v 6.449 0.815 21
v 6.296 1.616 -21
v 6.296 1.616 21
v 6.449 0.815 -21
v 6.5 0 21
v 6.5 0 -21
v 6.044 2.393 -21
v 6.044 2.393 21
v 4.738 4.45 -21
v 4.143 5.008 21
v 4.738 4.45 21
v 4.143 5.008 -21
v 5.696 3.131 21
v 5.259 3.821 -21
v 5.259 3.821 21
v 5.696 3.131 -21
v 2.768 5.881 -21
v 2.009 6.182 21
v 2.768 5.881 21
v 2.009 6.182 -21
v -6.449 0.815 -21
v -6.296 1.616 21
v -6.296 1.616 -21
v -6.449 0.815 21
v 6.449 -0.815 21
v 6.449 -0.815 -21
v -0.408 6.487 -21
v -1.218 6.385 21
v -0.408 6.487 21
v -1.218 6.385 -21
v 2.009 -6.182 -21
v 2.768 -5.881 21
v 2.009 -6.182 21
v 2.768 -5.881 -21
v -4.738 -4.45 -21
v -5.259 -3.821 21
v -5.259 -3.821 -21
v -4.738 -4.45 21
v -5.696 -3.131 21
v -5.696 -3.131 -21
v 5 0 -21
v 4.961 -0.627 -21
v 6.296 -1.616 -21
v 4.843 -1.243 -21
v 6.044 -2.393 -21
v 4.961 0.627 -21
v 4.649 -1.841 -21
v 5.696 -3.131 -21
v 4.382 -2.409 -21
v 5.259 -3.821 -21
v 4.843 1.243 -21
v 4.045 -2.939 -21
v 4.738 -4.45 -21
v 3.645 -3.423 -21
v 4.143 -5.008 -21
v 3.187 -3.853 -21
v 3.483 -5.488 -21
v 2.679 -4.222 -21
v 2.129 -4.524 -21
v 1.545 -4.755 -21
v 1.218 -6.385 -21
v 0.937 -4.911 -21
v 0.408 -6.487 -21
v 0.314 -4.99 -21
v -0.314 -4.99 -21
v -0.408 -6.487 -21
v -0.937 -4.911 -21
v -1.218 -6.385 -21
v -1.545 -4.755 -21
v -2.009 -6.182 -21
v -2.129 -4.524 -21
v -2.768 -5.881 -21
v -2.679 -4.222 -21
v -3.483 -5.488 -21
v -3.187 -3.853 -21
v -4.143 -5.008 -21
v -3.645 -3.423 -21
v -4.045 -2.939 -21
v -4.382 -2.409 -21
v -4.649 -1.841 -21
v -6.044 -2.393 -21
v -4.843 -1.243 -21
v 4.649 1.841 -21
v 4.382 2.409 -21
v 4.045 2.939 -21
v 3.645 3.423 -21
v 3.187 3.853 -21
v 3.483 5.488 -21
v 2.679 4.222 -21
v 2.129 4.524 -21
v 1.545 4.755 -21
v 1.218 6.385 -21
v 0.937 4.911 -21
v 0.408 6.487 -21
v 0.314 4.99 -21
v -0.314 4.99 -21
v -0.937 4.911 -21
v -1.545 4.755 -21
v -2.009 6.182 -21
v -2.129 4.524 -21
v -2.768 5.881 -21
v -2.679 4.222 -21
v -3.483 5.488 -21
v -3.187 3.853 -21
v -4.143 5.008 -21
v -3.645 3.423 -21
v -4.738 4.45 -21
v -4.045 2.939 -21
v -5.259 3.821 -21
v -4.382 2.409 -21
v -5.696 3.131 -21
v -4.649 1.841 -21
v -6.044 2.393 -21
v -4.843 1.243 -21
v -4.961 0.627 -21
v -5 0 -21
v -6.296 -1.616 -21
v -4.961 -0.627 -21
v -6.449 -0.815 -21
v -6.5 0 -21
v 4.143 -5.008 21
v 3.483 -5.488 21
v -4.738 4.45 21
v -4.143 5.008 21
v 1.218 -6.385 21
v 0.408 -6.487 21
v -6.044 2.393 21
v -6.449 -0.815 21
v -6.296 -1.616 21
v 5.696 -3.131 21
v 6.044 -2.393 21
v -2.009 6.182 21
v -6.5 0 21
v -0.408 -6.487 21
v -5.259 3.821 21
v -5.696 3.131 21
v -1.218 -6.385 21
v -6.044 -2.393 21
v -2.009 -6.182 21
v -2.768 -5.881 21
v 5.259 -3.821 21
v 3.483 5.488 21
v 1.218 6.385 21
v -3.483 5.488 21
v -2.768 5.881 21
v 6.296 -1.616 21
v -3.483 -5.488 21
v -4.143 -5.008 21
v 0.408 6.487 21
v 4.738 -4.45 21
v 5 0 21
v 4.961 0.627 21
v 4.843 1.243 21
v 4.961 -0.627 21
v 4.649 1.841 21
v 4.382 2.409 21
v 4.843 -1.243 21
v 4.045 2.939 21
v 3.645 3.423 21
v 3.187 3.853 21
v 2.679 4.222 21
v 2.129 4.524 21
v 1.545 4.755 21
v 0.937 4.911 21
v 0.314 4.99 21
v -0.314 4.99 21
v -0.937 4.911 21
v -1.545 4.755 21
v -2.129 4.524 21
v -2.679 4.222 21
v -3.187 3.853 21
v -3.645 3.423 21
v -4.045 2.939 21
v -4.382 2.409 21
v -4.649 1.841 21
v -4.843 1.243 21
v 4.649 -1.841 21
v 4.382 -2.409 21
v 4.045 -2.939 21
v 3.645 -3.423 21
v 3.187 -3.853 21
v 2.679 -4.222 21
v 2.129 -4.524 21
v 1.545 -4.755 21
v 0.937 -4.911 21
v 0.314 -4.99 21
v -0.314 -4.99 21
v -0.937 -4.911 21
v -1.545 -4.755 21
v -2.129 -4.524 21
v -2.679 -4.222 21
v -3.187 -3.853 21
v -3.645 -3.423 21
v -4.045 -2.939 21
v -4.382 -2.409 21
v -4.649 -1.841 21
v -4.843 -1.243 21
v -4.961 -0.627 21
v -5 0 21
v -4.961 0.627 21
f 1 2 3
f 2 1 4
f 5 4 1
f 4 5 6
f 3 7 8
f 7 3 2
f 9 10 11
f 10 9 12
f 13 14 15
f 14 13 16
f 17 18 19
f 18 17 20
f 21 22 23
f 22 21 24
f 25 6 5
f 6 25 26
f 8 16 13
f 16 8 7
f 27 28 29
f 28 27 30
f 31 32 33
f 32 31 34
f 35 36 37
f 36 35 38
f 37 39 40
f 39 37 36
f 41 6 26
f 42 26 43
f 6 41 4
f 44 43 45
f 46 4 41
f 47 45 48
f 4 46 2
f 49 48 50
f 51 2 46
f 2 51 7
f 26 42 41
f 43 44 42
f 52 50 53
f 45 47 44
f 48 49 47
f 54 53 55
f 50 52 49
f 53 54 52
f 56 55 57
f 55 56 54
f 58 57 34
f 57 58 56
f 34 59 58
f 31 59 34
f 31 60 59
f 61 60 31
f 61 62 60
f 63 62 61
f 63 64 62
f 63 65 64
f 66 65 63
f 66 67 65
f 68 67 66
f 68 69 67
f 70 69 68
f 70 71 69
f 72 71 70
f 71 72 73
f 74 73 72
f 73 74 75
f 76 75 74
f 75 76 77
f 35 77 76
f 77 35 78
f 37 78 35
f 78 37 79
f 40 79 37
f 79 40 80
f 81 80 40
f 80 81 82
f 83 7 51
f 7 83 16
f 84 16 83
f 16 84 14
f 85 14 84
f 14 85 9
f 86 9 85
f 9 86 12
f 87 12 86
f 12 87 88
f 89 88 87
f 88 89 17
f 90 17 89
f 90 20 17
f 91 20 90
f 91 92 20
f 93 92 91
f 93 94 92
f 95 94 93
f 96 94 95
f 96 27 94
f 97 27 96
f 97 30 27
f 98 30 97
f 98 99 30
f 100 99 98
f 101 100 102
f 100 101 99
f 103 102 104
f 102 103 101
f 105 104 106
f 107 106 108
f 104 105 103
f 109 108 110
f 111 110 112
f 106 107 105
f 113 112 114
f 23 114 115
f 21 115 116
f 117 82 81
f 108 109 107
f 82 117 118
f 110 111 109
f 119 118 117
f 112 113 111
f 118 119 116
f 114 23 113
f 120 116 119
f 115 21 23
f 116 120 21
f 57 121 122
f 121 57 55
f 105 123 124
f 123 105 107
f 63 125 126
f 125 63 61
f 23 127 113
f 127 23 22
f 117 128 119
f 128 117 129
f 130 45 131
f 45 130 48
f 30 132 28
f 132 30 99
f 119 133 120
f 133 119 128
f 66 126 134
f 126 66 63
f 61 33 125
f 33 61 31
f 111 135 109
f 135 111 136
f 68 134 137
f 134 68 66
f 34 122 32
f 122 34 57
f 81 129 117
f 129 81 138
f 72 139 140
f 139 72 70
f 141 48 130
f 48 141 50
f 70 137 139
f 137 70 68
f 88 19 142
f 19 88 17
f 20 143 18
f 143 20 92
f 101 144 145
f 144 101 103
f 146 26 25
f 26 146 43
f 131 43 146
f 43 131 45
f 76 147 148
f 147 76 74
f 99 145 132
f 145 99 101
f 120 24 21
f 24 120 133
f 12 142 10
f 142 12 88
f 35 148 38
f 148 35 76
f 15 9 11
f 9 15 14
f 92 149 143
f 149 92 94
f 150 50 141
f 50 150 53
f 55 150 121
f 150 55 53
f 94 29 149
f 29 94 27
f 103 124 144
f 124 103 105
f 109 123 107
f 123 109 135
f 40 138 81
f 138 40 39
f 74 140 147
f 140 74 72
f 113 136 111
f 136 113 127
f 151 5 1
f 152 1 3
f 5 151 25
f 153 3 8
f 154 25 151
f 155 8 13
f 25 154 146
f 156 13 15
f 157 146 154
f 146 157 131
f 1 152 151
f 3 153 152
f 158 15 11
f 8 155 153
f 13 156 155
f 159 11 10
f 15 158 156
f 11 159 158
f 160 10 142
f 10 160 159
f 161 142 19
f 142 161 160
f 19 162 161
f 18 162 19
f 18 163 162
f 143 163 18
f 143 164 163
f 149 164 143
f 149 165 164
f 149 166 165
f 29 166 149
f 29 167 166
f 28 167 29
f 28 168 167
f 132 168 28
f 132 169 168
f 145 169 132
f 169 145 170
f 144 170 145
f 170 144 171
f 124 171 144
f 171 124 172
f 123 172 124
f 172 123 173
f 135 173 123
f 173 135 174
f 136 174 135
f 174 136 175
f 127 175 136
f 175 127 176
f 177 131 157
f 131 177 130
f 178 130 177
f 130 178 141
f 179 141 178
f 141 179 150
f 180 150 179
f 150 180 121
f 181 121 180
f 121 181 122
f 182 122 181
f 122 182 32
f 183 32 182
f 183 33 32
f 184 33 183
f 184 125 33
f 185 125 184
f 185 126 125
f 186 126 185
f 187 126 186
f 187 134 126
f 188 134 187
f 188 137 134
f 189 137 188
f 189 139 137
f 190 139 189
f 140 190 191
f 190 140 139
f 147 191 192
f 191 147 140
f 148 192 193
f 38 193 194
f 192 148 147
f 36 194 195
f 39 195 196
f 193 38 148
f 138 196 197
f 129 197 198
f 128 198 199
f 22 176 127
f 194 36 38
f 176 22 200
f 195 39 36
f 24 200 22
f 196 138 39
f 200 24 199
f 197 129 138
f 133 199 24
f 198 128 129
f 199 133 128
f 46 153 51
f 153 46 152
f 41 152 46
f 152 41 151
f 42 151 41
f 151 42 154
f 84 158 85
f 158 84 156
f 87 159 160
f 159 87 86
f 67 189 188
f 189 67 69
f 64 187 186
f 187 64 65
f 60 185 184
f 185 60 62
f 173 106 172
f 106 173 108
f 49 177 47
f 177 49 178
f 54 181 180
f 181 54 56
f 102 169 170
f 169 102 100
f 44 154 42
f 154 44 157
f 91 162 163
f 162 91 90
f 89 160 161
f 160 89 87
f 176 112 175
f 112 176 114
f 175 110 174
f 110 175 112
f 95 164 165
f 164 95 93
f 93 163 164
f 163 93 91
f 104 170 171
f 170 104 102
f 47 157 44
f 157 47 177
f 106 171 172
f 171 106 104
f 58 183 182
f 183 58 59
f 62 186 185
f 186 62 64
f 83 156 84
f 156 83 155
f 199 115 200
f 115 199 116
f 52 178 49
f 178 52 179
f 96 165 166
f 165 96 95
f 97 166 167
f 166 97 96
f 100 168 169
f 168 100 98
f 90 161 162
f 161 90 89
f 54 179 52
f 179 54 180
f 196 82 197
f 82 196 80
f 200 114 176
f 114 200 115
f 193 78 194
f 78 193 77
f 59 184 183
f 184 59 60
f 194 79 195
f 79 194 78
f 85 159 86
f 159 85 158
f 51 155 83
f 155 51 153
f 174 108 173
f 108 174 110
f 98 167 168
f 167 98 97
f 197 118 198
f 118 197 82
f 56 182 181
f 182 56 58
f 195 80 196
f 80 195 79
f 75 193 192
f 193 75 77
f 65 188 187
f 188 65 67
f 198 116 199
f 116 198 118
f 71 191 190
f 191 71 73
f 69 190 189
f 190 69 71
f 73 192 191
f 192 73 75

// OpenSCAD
$fn = 50;


difference() {
	union() {
		translate(v = [0, 0, -21.0000000000]) {
			cylinder(h = 42, r = 6.5000000000);
		}
	}
	union() {
		translate(v = [0, 0, -100.0000000000]) {
			cylinder(h = 200, r = 5.0000000000);
		}
	}
}
